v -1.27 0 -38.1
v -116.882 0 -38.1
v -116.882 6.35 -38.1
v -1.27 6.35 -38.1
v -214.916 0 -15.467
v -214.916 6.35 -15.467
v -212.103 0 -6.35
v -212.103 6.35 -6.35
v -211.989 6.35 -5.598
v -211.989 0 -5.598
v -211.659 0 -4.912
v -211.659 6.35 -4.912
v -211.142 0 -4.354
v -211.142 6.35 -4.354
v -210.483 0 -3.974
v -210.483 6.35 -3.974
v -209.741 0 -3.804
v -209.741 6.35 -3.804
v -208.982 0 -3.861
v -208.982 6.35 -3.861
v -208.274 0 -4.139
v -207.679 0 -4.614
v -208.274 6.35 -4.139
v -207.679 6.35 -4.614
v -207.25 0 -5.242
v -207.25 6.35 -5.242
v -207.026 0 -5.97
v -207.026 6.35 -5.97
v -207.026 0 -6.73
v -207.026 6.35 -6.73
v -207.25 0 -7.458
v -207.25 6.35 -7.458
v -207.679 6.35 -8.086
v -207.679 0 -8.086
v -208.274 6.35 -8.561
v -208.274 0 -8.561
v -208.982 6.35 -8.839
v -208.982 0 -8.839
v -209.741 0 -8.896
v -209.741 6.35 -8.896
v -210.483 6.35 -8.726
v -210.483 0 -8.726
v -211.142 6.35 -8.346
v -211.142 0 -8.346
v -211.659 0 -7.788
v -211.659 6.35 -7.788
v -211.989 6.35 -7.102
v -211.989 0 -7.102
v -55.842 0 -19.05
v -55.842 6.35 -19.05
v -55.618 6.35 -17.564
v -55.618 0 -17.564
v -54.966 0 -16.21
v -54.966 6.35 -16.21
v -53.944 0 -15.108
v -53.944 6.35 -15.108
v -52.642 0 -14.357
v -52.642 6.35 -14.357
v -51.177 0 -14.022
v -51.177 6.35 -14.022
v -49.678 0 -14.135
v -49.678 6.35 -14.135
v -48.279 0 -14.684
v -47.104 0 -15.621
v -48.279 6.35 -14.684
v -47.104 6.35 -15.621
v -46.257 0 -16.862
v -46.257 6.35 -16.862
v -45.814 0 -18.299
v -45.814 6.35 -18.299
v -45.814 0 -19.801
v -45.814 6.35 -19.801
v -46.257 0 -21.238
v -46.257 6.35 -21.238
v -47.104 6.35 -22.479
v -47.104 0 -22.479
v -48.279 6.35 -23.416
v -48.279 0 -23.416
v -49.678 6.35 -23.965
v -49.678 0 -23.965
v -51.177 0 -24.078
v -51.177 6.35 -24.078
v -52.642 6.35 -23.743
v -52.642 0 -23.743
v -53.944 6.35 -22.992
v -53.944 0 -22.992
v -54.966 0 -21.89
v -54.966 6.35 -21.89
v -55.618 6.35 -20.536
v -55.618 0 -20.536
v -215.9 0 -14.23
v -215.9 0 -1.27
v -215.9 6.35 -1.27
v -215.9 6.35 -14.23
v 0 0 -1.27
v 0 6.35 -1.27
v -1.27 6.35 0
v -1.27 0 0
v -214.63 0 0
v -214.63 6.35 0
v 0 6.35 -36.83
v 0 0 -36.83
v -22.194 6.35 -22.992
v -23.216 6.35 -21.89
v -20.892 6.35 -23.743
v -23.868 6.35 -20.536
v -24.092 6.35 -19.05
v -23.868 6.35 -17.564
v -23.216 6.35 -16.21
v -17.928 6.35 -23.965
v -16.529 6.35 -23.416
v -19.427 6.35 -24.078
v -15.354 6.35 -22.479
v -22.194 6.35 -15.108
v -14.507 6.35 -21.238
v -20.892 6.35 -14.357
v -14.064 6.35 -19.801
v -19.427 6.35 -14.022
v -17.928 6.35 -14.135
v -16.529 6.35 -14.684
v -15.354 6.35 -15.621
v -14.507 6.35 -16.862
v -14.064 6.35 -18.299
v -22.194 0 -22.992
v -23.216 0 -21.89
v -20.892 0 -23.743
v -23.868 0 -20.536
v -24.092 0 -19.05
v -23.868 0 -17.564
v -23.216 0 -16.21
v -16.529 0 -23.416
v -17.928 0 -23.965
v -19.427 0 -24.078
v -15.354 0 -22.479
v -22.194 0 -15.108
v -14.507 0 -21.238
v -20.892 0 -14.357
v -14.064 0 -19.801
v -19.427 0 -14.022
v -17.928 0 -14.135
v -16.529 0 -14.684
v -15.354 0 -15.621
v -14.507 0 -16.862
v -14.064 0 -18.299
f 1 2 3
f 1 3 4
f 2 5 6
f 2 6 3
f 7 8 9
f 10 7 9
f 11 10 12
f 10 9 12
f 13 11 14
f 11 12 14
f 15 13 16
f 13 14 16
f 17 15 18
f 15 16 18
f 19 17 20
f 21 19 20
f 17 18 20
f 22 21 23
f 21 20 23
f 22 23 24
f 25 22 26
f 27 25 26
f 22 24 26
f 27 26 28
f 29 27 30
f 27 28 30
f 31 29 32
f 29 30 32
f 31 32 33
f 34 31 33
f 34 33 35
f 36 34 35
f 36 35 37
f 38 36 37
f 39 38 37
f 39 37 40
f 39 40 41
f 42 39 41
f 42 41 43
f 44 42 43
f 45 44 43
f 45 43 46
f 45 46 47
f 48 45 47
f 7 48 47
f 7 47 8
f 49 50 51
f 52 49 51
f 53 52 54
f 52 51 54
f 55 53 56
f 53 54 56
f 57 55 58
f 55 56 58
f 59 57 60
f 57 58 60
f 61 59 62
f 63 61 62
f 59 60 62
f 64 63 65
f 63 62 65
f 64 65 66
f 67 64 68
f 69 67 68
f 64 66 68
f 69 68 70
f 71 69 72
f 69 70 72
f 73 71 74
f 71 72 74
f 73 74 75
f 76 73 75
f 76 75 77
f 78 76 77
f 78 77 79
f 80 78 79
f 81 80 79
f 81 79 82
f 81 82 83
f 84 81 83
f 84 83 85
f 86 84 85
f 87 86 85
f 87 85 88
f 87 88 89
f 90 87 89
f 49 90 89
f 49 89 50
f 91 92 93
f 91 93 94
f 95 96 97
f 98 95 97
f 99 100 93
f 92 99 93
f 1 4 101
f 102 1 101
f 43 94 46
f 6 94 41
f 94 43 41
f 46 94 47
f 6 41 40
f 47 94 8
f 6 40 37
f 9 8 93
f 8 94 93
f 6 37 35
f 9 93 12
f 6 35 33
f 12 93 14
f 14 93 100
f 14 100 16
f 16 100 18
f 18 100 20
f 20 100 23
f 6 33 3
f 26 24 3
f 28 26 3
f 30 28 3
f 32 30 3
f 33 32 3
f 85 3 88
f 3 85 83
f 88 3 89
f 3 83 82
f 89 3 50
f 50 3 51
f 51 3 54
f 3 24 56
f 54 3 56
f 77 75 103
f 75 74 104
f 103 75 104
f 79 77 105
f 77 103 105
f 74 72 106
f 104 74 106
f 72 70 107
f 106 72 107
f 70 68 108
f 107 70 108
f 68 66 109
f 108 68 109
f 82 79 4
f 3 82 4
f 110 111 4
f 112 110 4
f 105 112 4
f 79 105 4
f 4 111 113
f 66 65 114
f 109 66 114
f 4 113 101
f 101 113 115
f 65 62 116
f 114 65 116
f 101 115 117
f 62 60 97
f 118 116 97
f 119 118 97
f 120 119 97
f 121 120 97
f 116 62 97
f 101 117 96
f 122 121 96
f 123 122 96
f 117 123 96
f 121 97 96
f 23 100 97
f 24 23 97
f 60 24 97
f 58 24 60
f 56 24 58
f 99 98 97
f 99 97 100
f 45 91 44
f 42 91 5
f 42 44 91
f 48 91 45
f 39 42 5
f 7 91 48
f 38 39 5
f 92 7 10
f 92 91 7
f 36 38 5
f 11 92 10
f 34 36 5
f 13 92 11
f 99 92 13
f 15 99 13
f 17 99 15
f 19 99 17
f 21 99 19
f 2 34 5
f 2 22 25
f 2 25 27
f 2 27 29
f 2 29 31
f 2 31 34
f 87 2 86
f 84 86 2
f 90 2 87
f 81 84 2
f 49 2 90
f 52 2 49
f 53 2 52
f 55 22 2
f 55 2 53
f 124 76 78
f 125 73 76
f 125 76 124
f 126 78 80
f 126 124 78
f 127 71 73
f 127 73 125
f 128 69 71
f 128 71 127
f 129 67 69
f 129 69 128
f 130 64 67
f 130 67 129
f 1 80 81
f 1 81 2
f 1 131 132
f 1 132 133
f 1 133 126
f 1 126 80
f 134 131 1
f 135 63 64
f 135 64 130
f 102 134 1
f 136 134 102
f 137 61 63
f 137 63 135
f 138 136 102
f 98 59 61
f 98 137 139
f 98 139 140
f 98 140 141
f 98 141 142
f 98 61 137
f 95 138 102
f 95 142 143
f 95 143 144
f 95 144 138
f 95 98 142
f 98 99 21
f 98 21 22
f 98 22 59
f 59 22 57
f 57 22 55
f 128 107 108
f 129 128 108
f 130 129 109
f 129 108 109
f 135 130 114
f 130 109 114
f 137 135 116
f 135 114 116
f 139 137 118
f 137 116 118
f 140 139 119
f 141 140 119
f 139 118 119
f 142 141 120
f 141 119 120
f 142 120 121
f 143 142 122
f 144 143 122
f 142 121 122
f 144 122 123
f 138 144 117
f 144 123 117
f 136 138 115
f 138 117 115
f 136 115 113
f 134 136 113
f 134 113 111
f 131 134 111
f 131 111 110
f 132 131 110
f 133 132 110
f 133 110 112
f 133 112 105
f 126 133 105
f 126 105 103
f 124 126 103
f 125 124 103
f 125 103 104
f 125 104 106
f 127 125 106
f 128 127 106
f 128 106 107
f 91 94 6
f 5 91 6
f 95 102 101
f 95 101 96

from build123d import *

# Parameters (mm, degrees)
F1_DEPTH    = 6.35
F2_T1_DEPTH = 12.8820747894
F2_T3_DEPTH = 11.6021811914
F4_D        = 10.0838
F6_D        = 5.1054


# Not quite as in the source:
# - a fillet or chamfer that OpenCascade refuses, or shapes differently, is made with other operations: its cross-section is extruded or revolved along the edge and cut away or added


with BuildPart() as f1:
    # F0 (on Front) → F1 (new body)
    with BuildSketch(Plane.XZ):
        Polygon((0, -38.1), (0, 0), (-215.9, 0), (-215.9, -15.24), (-116.8824615139, -38.1), align=None)
    extrude(amount=-F1_DEPTH)

    # F2: chamfer of 1.27 on 4 edges, made by hand

    # F2_s2 → F2_t1 (cut)
    with BuildSketch(Plane.XZ.offset(-9.6160373947)):
        Polygon((-214.63, 0), (-215.9, -1.27), (-215.9, 0), align=None)
        Polygon((-1.27, -38.1), (0, -36.83), (0, -38.1), align=None)
        Polygon((0, -1.27), (-1.27, 0), (0, 0), align=None)
    extrude(amount=F2_T1_DEPTH, mode=Mode.SUBTRACT)

    # F2_s4 → F2_t3 (cut)
    with BuildSketch(Plane.XZ.offset(-8.9760905957)):
        Polygon((-215.9, -14.2297963858), (-214.915687839, -15.4672463681), (-215.9, -15.24), align=None)
    extrude(amount=F2_T3_DEPTH, mode=Mode.SUBTRACT)

    # F4 (through all)
    with Locations(Plane.XZ):
        with Locations((-50.8, -19.05), (-19.05, -19.05)):
            Hole(F4_D / 2)

    # F6 (through all)
    with Locations(Plane.XZ):
        with Locations((-209.55, -6.35)):
            Hole(F6_D / 2)


solid = f1.part
